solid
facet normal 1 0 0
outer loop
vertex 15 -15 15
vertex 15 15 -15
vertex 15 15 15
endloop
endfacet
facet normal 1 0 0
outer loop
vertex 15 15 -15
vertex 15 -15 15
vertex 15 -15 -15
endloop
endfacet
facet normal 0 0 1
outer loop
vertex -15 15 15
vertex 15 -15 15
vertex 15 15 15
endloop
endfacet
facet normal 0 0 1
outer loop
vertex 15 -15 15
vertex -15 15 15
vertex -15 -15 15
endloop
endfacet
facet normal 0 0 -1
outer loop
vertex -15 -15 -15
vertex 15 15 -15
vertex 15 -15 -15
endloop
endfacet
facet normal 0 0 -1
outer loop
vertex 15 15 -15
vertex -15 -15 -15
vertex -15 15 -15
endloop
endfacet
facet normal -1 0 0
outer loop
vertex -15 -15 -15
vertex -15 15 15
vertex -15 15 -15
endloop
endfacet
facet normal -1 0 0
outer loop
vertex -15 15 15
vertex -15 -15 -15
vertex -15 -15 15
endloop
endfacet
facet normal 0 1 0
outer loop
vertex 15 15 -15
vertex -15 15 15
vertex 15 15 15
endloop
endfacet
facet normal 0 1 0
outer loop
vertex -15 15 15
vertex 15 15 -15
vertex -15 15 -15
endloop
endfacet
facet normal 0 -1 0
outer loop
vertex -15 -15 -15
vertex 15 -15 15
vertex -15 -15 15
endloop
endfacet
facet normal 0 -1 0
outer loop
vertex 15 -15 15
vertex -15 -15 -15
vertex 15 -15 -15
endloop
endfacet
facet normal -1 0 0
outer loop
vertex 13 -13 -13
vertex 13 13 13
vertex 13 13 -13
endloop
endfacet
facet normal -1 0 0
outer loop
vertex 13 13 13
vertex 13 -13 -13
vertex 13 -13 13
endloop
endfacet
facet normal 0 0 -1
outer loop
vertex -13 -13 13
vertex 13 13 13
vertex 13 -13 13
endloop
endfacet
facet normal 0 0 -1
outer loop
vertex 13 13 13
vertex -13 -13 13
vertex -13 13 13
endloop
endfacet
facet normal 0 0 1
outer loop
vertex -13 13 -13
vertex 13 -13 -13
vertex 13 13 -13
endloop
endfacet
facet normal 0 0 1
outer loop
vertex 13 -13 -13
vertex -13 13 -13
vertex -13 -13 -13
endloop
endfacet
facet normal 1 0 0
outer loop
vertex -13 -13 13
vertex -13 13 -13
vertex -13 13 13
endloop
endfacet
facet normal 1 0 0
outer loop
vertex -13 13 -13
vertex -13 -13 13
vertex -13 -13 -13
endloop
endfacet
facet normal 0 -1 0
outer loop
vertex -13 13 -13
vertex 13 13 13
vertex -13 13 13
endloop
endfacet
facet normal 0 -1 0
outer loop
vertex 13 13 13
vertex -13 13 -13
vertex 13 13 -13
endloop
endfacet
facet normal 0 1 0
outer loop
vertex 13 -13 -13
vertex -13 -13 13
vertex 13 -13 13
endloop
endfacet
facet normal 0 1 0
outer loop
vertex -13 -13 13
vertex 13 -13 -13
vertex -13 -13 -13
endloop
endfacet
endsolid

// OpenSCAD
// Parameterized cube module with optional rounded edges and hollow interior
module param_cube(
    size = [50, 50, 50],  // [x, y, z] dimensions
    center = true,        // center the cube
    wall_thickness = 2,   // wall thickness for hollow cube (0 for solid)
    corner_radius = 0,    // radius for rounded corners (0 for sharp corners)
    $fn = 32             // resolution for rounded corners
) {
    // Validate inputs
    assert(len(size) == 3, "Size must be a vector of [x, y, z] dimensions");
    assert(wall_thickness >= 0, "Wall thickness must be non-negative");
    assert(corner_radius >= 0, "Corner radius must be non-negative");
    
    // Create solid or hollow cube
    difference() {
        // Outer cube
        if (corner_radius > 0) {
            // Rounded cube using minkowski
            minkowski() {
                cube([
                    size[0] - 2 * corner_radius,
                    size[1] - 2 * corner_radius,
                    size[2] - 2 * corner_radius
                ], center = center);
                sphere(r = corner_radius);
            }
        } else {
            // Regular cube
            cube(size, center = center);
        }
        
        // Interior hollow (if wall_thickness > 0)
        if (wall_thickness > 0) {
            translate([0, 0, 0])
            cube([
                size[0] - 2 * wall_thickness,
                size[1] - 2 * wall_thickness,
                size[2] - 2 * wall_thickness
            ], center = center);
        }
    }
}

// Example usage:
// Basic cube
param_cube([30, 30, 30]);

// Hollow cube with 2mm walls
// translate([40, 0, 0])
// param_cube([30, 30, 30], wall_thickness = 2);

// Rounded cube
// translate([80, 0, 0])
// param_cube([30, 30, 30], corner_radius = 5);

// Hollow rounded cube
// translate([120, 0, 0])
// param_cube([30, 30, 30], wall_thickness = 2, corner_radius = 5);
